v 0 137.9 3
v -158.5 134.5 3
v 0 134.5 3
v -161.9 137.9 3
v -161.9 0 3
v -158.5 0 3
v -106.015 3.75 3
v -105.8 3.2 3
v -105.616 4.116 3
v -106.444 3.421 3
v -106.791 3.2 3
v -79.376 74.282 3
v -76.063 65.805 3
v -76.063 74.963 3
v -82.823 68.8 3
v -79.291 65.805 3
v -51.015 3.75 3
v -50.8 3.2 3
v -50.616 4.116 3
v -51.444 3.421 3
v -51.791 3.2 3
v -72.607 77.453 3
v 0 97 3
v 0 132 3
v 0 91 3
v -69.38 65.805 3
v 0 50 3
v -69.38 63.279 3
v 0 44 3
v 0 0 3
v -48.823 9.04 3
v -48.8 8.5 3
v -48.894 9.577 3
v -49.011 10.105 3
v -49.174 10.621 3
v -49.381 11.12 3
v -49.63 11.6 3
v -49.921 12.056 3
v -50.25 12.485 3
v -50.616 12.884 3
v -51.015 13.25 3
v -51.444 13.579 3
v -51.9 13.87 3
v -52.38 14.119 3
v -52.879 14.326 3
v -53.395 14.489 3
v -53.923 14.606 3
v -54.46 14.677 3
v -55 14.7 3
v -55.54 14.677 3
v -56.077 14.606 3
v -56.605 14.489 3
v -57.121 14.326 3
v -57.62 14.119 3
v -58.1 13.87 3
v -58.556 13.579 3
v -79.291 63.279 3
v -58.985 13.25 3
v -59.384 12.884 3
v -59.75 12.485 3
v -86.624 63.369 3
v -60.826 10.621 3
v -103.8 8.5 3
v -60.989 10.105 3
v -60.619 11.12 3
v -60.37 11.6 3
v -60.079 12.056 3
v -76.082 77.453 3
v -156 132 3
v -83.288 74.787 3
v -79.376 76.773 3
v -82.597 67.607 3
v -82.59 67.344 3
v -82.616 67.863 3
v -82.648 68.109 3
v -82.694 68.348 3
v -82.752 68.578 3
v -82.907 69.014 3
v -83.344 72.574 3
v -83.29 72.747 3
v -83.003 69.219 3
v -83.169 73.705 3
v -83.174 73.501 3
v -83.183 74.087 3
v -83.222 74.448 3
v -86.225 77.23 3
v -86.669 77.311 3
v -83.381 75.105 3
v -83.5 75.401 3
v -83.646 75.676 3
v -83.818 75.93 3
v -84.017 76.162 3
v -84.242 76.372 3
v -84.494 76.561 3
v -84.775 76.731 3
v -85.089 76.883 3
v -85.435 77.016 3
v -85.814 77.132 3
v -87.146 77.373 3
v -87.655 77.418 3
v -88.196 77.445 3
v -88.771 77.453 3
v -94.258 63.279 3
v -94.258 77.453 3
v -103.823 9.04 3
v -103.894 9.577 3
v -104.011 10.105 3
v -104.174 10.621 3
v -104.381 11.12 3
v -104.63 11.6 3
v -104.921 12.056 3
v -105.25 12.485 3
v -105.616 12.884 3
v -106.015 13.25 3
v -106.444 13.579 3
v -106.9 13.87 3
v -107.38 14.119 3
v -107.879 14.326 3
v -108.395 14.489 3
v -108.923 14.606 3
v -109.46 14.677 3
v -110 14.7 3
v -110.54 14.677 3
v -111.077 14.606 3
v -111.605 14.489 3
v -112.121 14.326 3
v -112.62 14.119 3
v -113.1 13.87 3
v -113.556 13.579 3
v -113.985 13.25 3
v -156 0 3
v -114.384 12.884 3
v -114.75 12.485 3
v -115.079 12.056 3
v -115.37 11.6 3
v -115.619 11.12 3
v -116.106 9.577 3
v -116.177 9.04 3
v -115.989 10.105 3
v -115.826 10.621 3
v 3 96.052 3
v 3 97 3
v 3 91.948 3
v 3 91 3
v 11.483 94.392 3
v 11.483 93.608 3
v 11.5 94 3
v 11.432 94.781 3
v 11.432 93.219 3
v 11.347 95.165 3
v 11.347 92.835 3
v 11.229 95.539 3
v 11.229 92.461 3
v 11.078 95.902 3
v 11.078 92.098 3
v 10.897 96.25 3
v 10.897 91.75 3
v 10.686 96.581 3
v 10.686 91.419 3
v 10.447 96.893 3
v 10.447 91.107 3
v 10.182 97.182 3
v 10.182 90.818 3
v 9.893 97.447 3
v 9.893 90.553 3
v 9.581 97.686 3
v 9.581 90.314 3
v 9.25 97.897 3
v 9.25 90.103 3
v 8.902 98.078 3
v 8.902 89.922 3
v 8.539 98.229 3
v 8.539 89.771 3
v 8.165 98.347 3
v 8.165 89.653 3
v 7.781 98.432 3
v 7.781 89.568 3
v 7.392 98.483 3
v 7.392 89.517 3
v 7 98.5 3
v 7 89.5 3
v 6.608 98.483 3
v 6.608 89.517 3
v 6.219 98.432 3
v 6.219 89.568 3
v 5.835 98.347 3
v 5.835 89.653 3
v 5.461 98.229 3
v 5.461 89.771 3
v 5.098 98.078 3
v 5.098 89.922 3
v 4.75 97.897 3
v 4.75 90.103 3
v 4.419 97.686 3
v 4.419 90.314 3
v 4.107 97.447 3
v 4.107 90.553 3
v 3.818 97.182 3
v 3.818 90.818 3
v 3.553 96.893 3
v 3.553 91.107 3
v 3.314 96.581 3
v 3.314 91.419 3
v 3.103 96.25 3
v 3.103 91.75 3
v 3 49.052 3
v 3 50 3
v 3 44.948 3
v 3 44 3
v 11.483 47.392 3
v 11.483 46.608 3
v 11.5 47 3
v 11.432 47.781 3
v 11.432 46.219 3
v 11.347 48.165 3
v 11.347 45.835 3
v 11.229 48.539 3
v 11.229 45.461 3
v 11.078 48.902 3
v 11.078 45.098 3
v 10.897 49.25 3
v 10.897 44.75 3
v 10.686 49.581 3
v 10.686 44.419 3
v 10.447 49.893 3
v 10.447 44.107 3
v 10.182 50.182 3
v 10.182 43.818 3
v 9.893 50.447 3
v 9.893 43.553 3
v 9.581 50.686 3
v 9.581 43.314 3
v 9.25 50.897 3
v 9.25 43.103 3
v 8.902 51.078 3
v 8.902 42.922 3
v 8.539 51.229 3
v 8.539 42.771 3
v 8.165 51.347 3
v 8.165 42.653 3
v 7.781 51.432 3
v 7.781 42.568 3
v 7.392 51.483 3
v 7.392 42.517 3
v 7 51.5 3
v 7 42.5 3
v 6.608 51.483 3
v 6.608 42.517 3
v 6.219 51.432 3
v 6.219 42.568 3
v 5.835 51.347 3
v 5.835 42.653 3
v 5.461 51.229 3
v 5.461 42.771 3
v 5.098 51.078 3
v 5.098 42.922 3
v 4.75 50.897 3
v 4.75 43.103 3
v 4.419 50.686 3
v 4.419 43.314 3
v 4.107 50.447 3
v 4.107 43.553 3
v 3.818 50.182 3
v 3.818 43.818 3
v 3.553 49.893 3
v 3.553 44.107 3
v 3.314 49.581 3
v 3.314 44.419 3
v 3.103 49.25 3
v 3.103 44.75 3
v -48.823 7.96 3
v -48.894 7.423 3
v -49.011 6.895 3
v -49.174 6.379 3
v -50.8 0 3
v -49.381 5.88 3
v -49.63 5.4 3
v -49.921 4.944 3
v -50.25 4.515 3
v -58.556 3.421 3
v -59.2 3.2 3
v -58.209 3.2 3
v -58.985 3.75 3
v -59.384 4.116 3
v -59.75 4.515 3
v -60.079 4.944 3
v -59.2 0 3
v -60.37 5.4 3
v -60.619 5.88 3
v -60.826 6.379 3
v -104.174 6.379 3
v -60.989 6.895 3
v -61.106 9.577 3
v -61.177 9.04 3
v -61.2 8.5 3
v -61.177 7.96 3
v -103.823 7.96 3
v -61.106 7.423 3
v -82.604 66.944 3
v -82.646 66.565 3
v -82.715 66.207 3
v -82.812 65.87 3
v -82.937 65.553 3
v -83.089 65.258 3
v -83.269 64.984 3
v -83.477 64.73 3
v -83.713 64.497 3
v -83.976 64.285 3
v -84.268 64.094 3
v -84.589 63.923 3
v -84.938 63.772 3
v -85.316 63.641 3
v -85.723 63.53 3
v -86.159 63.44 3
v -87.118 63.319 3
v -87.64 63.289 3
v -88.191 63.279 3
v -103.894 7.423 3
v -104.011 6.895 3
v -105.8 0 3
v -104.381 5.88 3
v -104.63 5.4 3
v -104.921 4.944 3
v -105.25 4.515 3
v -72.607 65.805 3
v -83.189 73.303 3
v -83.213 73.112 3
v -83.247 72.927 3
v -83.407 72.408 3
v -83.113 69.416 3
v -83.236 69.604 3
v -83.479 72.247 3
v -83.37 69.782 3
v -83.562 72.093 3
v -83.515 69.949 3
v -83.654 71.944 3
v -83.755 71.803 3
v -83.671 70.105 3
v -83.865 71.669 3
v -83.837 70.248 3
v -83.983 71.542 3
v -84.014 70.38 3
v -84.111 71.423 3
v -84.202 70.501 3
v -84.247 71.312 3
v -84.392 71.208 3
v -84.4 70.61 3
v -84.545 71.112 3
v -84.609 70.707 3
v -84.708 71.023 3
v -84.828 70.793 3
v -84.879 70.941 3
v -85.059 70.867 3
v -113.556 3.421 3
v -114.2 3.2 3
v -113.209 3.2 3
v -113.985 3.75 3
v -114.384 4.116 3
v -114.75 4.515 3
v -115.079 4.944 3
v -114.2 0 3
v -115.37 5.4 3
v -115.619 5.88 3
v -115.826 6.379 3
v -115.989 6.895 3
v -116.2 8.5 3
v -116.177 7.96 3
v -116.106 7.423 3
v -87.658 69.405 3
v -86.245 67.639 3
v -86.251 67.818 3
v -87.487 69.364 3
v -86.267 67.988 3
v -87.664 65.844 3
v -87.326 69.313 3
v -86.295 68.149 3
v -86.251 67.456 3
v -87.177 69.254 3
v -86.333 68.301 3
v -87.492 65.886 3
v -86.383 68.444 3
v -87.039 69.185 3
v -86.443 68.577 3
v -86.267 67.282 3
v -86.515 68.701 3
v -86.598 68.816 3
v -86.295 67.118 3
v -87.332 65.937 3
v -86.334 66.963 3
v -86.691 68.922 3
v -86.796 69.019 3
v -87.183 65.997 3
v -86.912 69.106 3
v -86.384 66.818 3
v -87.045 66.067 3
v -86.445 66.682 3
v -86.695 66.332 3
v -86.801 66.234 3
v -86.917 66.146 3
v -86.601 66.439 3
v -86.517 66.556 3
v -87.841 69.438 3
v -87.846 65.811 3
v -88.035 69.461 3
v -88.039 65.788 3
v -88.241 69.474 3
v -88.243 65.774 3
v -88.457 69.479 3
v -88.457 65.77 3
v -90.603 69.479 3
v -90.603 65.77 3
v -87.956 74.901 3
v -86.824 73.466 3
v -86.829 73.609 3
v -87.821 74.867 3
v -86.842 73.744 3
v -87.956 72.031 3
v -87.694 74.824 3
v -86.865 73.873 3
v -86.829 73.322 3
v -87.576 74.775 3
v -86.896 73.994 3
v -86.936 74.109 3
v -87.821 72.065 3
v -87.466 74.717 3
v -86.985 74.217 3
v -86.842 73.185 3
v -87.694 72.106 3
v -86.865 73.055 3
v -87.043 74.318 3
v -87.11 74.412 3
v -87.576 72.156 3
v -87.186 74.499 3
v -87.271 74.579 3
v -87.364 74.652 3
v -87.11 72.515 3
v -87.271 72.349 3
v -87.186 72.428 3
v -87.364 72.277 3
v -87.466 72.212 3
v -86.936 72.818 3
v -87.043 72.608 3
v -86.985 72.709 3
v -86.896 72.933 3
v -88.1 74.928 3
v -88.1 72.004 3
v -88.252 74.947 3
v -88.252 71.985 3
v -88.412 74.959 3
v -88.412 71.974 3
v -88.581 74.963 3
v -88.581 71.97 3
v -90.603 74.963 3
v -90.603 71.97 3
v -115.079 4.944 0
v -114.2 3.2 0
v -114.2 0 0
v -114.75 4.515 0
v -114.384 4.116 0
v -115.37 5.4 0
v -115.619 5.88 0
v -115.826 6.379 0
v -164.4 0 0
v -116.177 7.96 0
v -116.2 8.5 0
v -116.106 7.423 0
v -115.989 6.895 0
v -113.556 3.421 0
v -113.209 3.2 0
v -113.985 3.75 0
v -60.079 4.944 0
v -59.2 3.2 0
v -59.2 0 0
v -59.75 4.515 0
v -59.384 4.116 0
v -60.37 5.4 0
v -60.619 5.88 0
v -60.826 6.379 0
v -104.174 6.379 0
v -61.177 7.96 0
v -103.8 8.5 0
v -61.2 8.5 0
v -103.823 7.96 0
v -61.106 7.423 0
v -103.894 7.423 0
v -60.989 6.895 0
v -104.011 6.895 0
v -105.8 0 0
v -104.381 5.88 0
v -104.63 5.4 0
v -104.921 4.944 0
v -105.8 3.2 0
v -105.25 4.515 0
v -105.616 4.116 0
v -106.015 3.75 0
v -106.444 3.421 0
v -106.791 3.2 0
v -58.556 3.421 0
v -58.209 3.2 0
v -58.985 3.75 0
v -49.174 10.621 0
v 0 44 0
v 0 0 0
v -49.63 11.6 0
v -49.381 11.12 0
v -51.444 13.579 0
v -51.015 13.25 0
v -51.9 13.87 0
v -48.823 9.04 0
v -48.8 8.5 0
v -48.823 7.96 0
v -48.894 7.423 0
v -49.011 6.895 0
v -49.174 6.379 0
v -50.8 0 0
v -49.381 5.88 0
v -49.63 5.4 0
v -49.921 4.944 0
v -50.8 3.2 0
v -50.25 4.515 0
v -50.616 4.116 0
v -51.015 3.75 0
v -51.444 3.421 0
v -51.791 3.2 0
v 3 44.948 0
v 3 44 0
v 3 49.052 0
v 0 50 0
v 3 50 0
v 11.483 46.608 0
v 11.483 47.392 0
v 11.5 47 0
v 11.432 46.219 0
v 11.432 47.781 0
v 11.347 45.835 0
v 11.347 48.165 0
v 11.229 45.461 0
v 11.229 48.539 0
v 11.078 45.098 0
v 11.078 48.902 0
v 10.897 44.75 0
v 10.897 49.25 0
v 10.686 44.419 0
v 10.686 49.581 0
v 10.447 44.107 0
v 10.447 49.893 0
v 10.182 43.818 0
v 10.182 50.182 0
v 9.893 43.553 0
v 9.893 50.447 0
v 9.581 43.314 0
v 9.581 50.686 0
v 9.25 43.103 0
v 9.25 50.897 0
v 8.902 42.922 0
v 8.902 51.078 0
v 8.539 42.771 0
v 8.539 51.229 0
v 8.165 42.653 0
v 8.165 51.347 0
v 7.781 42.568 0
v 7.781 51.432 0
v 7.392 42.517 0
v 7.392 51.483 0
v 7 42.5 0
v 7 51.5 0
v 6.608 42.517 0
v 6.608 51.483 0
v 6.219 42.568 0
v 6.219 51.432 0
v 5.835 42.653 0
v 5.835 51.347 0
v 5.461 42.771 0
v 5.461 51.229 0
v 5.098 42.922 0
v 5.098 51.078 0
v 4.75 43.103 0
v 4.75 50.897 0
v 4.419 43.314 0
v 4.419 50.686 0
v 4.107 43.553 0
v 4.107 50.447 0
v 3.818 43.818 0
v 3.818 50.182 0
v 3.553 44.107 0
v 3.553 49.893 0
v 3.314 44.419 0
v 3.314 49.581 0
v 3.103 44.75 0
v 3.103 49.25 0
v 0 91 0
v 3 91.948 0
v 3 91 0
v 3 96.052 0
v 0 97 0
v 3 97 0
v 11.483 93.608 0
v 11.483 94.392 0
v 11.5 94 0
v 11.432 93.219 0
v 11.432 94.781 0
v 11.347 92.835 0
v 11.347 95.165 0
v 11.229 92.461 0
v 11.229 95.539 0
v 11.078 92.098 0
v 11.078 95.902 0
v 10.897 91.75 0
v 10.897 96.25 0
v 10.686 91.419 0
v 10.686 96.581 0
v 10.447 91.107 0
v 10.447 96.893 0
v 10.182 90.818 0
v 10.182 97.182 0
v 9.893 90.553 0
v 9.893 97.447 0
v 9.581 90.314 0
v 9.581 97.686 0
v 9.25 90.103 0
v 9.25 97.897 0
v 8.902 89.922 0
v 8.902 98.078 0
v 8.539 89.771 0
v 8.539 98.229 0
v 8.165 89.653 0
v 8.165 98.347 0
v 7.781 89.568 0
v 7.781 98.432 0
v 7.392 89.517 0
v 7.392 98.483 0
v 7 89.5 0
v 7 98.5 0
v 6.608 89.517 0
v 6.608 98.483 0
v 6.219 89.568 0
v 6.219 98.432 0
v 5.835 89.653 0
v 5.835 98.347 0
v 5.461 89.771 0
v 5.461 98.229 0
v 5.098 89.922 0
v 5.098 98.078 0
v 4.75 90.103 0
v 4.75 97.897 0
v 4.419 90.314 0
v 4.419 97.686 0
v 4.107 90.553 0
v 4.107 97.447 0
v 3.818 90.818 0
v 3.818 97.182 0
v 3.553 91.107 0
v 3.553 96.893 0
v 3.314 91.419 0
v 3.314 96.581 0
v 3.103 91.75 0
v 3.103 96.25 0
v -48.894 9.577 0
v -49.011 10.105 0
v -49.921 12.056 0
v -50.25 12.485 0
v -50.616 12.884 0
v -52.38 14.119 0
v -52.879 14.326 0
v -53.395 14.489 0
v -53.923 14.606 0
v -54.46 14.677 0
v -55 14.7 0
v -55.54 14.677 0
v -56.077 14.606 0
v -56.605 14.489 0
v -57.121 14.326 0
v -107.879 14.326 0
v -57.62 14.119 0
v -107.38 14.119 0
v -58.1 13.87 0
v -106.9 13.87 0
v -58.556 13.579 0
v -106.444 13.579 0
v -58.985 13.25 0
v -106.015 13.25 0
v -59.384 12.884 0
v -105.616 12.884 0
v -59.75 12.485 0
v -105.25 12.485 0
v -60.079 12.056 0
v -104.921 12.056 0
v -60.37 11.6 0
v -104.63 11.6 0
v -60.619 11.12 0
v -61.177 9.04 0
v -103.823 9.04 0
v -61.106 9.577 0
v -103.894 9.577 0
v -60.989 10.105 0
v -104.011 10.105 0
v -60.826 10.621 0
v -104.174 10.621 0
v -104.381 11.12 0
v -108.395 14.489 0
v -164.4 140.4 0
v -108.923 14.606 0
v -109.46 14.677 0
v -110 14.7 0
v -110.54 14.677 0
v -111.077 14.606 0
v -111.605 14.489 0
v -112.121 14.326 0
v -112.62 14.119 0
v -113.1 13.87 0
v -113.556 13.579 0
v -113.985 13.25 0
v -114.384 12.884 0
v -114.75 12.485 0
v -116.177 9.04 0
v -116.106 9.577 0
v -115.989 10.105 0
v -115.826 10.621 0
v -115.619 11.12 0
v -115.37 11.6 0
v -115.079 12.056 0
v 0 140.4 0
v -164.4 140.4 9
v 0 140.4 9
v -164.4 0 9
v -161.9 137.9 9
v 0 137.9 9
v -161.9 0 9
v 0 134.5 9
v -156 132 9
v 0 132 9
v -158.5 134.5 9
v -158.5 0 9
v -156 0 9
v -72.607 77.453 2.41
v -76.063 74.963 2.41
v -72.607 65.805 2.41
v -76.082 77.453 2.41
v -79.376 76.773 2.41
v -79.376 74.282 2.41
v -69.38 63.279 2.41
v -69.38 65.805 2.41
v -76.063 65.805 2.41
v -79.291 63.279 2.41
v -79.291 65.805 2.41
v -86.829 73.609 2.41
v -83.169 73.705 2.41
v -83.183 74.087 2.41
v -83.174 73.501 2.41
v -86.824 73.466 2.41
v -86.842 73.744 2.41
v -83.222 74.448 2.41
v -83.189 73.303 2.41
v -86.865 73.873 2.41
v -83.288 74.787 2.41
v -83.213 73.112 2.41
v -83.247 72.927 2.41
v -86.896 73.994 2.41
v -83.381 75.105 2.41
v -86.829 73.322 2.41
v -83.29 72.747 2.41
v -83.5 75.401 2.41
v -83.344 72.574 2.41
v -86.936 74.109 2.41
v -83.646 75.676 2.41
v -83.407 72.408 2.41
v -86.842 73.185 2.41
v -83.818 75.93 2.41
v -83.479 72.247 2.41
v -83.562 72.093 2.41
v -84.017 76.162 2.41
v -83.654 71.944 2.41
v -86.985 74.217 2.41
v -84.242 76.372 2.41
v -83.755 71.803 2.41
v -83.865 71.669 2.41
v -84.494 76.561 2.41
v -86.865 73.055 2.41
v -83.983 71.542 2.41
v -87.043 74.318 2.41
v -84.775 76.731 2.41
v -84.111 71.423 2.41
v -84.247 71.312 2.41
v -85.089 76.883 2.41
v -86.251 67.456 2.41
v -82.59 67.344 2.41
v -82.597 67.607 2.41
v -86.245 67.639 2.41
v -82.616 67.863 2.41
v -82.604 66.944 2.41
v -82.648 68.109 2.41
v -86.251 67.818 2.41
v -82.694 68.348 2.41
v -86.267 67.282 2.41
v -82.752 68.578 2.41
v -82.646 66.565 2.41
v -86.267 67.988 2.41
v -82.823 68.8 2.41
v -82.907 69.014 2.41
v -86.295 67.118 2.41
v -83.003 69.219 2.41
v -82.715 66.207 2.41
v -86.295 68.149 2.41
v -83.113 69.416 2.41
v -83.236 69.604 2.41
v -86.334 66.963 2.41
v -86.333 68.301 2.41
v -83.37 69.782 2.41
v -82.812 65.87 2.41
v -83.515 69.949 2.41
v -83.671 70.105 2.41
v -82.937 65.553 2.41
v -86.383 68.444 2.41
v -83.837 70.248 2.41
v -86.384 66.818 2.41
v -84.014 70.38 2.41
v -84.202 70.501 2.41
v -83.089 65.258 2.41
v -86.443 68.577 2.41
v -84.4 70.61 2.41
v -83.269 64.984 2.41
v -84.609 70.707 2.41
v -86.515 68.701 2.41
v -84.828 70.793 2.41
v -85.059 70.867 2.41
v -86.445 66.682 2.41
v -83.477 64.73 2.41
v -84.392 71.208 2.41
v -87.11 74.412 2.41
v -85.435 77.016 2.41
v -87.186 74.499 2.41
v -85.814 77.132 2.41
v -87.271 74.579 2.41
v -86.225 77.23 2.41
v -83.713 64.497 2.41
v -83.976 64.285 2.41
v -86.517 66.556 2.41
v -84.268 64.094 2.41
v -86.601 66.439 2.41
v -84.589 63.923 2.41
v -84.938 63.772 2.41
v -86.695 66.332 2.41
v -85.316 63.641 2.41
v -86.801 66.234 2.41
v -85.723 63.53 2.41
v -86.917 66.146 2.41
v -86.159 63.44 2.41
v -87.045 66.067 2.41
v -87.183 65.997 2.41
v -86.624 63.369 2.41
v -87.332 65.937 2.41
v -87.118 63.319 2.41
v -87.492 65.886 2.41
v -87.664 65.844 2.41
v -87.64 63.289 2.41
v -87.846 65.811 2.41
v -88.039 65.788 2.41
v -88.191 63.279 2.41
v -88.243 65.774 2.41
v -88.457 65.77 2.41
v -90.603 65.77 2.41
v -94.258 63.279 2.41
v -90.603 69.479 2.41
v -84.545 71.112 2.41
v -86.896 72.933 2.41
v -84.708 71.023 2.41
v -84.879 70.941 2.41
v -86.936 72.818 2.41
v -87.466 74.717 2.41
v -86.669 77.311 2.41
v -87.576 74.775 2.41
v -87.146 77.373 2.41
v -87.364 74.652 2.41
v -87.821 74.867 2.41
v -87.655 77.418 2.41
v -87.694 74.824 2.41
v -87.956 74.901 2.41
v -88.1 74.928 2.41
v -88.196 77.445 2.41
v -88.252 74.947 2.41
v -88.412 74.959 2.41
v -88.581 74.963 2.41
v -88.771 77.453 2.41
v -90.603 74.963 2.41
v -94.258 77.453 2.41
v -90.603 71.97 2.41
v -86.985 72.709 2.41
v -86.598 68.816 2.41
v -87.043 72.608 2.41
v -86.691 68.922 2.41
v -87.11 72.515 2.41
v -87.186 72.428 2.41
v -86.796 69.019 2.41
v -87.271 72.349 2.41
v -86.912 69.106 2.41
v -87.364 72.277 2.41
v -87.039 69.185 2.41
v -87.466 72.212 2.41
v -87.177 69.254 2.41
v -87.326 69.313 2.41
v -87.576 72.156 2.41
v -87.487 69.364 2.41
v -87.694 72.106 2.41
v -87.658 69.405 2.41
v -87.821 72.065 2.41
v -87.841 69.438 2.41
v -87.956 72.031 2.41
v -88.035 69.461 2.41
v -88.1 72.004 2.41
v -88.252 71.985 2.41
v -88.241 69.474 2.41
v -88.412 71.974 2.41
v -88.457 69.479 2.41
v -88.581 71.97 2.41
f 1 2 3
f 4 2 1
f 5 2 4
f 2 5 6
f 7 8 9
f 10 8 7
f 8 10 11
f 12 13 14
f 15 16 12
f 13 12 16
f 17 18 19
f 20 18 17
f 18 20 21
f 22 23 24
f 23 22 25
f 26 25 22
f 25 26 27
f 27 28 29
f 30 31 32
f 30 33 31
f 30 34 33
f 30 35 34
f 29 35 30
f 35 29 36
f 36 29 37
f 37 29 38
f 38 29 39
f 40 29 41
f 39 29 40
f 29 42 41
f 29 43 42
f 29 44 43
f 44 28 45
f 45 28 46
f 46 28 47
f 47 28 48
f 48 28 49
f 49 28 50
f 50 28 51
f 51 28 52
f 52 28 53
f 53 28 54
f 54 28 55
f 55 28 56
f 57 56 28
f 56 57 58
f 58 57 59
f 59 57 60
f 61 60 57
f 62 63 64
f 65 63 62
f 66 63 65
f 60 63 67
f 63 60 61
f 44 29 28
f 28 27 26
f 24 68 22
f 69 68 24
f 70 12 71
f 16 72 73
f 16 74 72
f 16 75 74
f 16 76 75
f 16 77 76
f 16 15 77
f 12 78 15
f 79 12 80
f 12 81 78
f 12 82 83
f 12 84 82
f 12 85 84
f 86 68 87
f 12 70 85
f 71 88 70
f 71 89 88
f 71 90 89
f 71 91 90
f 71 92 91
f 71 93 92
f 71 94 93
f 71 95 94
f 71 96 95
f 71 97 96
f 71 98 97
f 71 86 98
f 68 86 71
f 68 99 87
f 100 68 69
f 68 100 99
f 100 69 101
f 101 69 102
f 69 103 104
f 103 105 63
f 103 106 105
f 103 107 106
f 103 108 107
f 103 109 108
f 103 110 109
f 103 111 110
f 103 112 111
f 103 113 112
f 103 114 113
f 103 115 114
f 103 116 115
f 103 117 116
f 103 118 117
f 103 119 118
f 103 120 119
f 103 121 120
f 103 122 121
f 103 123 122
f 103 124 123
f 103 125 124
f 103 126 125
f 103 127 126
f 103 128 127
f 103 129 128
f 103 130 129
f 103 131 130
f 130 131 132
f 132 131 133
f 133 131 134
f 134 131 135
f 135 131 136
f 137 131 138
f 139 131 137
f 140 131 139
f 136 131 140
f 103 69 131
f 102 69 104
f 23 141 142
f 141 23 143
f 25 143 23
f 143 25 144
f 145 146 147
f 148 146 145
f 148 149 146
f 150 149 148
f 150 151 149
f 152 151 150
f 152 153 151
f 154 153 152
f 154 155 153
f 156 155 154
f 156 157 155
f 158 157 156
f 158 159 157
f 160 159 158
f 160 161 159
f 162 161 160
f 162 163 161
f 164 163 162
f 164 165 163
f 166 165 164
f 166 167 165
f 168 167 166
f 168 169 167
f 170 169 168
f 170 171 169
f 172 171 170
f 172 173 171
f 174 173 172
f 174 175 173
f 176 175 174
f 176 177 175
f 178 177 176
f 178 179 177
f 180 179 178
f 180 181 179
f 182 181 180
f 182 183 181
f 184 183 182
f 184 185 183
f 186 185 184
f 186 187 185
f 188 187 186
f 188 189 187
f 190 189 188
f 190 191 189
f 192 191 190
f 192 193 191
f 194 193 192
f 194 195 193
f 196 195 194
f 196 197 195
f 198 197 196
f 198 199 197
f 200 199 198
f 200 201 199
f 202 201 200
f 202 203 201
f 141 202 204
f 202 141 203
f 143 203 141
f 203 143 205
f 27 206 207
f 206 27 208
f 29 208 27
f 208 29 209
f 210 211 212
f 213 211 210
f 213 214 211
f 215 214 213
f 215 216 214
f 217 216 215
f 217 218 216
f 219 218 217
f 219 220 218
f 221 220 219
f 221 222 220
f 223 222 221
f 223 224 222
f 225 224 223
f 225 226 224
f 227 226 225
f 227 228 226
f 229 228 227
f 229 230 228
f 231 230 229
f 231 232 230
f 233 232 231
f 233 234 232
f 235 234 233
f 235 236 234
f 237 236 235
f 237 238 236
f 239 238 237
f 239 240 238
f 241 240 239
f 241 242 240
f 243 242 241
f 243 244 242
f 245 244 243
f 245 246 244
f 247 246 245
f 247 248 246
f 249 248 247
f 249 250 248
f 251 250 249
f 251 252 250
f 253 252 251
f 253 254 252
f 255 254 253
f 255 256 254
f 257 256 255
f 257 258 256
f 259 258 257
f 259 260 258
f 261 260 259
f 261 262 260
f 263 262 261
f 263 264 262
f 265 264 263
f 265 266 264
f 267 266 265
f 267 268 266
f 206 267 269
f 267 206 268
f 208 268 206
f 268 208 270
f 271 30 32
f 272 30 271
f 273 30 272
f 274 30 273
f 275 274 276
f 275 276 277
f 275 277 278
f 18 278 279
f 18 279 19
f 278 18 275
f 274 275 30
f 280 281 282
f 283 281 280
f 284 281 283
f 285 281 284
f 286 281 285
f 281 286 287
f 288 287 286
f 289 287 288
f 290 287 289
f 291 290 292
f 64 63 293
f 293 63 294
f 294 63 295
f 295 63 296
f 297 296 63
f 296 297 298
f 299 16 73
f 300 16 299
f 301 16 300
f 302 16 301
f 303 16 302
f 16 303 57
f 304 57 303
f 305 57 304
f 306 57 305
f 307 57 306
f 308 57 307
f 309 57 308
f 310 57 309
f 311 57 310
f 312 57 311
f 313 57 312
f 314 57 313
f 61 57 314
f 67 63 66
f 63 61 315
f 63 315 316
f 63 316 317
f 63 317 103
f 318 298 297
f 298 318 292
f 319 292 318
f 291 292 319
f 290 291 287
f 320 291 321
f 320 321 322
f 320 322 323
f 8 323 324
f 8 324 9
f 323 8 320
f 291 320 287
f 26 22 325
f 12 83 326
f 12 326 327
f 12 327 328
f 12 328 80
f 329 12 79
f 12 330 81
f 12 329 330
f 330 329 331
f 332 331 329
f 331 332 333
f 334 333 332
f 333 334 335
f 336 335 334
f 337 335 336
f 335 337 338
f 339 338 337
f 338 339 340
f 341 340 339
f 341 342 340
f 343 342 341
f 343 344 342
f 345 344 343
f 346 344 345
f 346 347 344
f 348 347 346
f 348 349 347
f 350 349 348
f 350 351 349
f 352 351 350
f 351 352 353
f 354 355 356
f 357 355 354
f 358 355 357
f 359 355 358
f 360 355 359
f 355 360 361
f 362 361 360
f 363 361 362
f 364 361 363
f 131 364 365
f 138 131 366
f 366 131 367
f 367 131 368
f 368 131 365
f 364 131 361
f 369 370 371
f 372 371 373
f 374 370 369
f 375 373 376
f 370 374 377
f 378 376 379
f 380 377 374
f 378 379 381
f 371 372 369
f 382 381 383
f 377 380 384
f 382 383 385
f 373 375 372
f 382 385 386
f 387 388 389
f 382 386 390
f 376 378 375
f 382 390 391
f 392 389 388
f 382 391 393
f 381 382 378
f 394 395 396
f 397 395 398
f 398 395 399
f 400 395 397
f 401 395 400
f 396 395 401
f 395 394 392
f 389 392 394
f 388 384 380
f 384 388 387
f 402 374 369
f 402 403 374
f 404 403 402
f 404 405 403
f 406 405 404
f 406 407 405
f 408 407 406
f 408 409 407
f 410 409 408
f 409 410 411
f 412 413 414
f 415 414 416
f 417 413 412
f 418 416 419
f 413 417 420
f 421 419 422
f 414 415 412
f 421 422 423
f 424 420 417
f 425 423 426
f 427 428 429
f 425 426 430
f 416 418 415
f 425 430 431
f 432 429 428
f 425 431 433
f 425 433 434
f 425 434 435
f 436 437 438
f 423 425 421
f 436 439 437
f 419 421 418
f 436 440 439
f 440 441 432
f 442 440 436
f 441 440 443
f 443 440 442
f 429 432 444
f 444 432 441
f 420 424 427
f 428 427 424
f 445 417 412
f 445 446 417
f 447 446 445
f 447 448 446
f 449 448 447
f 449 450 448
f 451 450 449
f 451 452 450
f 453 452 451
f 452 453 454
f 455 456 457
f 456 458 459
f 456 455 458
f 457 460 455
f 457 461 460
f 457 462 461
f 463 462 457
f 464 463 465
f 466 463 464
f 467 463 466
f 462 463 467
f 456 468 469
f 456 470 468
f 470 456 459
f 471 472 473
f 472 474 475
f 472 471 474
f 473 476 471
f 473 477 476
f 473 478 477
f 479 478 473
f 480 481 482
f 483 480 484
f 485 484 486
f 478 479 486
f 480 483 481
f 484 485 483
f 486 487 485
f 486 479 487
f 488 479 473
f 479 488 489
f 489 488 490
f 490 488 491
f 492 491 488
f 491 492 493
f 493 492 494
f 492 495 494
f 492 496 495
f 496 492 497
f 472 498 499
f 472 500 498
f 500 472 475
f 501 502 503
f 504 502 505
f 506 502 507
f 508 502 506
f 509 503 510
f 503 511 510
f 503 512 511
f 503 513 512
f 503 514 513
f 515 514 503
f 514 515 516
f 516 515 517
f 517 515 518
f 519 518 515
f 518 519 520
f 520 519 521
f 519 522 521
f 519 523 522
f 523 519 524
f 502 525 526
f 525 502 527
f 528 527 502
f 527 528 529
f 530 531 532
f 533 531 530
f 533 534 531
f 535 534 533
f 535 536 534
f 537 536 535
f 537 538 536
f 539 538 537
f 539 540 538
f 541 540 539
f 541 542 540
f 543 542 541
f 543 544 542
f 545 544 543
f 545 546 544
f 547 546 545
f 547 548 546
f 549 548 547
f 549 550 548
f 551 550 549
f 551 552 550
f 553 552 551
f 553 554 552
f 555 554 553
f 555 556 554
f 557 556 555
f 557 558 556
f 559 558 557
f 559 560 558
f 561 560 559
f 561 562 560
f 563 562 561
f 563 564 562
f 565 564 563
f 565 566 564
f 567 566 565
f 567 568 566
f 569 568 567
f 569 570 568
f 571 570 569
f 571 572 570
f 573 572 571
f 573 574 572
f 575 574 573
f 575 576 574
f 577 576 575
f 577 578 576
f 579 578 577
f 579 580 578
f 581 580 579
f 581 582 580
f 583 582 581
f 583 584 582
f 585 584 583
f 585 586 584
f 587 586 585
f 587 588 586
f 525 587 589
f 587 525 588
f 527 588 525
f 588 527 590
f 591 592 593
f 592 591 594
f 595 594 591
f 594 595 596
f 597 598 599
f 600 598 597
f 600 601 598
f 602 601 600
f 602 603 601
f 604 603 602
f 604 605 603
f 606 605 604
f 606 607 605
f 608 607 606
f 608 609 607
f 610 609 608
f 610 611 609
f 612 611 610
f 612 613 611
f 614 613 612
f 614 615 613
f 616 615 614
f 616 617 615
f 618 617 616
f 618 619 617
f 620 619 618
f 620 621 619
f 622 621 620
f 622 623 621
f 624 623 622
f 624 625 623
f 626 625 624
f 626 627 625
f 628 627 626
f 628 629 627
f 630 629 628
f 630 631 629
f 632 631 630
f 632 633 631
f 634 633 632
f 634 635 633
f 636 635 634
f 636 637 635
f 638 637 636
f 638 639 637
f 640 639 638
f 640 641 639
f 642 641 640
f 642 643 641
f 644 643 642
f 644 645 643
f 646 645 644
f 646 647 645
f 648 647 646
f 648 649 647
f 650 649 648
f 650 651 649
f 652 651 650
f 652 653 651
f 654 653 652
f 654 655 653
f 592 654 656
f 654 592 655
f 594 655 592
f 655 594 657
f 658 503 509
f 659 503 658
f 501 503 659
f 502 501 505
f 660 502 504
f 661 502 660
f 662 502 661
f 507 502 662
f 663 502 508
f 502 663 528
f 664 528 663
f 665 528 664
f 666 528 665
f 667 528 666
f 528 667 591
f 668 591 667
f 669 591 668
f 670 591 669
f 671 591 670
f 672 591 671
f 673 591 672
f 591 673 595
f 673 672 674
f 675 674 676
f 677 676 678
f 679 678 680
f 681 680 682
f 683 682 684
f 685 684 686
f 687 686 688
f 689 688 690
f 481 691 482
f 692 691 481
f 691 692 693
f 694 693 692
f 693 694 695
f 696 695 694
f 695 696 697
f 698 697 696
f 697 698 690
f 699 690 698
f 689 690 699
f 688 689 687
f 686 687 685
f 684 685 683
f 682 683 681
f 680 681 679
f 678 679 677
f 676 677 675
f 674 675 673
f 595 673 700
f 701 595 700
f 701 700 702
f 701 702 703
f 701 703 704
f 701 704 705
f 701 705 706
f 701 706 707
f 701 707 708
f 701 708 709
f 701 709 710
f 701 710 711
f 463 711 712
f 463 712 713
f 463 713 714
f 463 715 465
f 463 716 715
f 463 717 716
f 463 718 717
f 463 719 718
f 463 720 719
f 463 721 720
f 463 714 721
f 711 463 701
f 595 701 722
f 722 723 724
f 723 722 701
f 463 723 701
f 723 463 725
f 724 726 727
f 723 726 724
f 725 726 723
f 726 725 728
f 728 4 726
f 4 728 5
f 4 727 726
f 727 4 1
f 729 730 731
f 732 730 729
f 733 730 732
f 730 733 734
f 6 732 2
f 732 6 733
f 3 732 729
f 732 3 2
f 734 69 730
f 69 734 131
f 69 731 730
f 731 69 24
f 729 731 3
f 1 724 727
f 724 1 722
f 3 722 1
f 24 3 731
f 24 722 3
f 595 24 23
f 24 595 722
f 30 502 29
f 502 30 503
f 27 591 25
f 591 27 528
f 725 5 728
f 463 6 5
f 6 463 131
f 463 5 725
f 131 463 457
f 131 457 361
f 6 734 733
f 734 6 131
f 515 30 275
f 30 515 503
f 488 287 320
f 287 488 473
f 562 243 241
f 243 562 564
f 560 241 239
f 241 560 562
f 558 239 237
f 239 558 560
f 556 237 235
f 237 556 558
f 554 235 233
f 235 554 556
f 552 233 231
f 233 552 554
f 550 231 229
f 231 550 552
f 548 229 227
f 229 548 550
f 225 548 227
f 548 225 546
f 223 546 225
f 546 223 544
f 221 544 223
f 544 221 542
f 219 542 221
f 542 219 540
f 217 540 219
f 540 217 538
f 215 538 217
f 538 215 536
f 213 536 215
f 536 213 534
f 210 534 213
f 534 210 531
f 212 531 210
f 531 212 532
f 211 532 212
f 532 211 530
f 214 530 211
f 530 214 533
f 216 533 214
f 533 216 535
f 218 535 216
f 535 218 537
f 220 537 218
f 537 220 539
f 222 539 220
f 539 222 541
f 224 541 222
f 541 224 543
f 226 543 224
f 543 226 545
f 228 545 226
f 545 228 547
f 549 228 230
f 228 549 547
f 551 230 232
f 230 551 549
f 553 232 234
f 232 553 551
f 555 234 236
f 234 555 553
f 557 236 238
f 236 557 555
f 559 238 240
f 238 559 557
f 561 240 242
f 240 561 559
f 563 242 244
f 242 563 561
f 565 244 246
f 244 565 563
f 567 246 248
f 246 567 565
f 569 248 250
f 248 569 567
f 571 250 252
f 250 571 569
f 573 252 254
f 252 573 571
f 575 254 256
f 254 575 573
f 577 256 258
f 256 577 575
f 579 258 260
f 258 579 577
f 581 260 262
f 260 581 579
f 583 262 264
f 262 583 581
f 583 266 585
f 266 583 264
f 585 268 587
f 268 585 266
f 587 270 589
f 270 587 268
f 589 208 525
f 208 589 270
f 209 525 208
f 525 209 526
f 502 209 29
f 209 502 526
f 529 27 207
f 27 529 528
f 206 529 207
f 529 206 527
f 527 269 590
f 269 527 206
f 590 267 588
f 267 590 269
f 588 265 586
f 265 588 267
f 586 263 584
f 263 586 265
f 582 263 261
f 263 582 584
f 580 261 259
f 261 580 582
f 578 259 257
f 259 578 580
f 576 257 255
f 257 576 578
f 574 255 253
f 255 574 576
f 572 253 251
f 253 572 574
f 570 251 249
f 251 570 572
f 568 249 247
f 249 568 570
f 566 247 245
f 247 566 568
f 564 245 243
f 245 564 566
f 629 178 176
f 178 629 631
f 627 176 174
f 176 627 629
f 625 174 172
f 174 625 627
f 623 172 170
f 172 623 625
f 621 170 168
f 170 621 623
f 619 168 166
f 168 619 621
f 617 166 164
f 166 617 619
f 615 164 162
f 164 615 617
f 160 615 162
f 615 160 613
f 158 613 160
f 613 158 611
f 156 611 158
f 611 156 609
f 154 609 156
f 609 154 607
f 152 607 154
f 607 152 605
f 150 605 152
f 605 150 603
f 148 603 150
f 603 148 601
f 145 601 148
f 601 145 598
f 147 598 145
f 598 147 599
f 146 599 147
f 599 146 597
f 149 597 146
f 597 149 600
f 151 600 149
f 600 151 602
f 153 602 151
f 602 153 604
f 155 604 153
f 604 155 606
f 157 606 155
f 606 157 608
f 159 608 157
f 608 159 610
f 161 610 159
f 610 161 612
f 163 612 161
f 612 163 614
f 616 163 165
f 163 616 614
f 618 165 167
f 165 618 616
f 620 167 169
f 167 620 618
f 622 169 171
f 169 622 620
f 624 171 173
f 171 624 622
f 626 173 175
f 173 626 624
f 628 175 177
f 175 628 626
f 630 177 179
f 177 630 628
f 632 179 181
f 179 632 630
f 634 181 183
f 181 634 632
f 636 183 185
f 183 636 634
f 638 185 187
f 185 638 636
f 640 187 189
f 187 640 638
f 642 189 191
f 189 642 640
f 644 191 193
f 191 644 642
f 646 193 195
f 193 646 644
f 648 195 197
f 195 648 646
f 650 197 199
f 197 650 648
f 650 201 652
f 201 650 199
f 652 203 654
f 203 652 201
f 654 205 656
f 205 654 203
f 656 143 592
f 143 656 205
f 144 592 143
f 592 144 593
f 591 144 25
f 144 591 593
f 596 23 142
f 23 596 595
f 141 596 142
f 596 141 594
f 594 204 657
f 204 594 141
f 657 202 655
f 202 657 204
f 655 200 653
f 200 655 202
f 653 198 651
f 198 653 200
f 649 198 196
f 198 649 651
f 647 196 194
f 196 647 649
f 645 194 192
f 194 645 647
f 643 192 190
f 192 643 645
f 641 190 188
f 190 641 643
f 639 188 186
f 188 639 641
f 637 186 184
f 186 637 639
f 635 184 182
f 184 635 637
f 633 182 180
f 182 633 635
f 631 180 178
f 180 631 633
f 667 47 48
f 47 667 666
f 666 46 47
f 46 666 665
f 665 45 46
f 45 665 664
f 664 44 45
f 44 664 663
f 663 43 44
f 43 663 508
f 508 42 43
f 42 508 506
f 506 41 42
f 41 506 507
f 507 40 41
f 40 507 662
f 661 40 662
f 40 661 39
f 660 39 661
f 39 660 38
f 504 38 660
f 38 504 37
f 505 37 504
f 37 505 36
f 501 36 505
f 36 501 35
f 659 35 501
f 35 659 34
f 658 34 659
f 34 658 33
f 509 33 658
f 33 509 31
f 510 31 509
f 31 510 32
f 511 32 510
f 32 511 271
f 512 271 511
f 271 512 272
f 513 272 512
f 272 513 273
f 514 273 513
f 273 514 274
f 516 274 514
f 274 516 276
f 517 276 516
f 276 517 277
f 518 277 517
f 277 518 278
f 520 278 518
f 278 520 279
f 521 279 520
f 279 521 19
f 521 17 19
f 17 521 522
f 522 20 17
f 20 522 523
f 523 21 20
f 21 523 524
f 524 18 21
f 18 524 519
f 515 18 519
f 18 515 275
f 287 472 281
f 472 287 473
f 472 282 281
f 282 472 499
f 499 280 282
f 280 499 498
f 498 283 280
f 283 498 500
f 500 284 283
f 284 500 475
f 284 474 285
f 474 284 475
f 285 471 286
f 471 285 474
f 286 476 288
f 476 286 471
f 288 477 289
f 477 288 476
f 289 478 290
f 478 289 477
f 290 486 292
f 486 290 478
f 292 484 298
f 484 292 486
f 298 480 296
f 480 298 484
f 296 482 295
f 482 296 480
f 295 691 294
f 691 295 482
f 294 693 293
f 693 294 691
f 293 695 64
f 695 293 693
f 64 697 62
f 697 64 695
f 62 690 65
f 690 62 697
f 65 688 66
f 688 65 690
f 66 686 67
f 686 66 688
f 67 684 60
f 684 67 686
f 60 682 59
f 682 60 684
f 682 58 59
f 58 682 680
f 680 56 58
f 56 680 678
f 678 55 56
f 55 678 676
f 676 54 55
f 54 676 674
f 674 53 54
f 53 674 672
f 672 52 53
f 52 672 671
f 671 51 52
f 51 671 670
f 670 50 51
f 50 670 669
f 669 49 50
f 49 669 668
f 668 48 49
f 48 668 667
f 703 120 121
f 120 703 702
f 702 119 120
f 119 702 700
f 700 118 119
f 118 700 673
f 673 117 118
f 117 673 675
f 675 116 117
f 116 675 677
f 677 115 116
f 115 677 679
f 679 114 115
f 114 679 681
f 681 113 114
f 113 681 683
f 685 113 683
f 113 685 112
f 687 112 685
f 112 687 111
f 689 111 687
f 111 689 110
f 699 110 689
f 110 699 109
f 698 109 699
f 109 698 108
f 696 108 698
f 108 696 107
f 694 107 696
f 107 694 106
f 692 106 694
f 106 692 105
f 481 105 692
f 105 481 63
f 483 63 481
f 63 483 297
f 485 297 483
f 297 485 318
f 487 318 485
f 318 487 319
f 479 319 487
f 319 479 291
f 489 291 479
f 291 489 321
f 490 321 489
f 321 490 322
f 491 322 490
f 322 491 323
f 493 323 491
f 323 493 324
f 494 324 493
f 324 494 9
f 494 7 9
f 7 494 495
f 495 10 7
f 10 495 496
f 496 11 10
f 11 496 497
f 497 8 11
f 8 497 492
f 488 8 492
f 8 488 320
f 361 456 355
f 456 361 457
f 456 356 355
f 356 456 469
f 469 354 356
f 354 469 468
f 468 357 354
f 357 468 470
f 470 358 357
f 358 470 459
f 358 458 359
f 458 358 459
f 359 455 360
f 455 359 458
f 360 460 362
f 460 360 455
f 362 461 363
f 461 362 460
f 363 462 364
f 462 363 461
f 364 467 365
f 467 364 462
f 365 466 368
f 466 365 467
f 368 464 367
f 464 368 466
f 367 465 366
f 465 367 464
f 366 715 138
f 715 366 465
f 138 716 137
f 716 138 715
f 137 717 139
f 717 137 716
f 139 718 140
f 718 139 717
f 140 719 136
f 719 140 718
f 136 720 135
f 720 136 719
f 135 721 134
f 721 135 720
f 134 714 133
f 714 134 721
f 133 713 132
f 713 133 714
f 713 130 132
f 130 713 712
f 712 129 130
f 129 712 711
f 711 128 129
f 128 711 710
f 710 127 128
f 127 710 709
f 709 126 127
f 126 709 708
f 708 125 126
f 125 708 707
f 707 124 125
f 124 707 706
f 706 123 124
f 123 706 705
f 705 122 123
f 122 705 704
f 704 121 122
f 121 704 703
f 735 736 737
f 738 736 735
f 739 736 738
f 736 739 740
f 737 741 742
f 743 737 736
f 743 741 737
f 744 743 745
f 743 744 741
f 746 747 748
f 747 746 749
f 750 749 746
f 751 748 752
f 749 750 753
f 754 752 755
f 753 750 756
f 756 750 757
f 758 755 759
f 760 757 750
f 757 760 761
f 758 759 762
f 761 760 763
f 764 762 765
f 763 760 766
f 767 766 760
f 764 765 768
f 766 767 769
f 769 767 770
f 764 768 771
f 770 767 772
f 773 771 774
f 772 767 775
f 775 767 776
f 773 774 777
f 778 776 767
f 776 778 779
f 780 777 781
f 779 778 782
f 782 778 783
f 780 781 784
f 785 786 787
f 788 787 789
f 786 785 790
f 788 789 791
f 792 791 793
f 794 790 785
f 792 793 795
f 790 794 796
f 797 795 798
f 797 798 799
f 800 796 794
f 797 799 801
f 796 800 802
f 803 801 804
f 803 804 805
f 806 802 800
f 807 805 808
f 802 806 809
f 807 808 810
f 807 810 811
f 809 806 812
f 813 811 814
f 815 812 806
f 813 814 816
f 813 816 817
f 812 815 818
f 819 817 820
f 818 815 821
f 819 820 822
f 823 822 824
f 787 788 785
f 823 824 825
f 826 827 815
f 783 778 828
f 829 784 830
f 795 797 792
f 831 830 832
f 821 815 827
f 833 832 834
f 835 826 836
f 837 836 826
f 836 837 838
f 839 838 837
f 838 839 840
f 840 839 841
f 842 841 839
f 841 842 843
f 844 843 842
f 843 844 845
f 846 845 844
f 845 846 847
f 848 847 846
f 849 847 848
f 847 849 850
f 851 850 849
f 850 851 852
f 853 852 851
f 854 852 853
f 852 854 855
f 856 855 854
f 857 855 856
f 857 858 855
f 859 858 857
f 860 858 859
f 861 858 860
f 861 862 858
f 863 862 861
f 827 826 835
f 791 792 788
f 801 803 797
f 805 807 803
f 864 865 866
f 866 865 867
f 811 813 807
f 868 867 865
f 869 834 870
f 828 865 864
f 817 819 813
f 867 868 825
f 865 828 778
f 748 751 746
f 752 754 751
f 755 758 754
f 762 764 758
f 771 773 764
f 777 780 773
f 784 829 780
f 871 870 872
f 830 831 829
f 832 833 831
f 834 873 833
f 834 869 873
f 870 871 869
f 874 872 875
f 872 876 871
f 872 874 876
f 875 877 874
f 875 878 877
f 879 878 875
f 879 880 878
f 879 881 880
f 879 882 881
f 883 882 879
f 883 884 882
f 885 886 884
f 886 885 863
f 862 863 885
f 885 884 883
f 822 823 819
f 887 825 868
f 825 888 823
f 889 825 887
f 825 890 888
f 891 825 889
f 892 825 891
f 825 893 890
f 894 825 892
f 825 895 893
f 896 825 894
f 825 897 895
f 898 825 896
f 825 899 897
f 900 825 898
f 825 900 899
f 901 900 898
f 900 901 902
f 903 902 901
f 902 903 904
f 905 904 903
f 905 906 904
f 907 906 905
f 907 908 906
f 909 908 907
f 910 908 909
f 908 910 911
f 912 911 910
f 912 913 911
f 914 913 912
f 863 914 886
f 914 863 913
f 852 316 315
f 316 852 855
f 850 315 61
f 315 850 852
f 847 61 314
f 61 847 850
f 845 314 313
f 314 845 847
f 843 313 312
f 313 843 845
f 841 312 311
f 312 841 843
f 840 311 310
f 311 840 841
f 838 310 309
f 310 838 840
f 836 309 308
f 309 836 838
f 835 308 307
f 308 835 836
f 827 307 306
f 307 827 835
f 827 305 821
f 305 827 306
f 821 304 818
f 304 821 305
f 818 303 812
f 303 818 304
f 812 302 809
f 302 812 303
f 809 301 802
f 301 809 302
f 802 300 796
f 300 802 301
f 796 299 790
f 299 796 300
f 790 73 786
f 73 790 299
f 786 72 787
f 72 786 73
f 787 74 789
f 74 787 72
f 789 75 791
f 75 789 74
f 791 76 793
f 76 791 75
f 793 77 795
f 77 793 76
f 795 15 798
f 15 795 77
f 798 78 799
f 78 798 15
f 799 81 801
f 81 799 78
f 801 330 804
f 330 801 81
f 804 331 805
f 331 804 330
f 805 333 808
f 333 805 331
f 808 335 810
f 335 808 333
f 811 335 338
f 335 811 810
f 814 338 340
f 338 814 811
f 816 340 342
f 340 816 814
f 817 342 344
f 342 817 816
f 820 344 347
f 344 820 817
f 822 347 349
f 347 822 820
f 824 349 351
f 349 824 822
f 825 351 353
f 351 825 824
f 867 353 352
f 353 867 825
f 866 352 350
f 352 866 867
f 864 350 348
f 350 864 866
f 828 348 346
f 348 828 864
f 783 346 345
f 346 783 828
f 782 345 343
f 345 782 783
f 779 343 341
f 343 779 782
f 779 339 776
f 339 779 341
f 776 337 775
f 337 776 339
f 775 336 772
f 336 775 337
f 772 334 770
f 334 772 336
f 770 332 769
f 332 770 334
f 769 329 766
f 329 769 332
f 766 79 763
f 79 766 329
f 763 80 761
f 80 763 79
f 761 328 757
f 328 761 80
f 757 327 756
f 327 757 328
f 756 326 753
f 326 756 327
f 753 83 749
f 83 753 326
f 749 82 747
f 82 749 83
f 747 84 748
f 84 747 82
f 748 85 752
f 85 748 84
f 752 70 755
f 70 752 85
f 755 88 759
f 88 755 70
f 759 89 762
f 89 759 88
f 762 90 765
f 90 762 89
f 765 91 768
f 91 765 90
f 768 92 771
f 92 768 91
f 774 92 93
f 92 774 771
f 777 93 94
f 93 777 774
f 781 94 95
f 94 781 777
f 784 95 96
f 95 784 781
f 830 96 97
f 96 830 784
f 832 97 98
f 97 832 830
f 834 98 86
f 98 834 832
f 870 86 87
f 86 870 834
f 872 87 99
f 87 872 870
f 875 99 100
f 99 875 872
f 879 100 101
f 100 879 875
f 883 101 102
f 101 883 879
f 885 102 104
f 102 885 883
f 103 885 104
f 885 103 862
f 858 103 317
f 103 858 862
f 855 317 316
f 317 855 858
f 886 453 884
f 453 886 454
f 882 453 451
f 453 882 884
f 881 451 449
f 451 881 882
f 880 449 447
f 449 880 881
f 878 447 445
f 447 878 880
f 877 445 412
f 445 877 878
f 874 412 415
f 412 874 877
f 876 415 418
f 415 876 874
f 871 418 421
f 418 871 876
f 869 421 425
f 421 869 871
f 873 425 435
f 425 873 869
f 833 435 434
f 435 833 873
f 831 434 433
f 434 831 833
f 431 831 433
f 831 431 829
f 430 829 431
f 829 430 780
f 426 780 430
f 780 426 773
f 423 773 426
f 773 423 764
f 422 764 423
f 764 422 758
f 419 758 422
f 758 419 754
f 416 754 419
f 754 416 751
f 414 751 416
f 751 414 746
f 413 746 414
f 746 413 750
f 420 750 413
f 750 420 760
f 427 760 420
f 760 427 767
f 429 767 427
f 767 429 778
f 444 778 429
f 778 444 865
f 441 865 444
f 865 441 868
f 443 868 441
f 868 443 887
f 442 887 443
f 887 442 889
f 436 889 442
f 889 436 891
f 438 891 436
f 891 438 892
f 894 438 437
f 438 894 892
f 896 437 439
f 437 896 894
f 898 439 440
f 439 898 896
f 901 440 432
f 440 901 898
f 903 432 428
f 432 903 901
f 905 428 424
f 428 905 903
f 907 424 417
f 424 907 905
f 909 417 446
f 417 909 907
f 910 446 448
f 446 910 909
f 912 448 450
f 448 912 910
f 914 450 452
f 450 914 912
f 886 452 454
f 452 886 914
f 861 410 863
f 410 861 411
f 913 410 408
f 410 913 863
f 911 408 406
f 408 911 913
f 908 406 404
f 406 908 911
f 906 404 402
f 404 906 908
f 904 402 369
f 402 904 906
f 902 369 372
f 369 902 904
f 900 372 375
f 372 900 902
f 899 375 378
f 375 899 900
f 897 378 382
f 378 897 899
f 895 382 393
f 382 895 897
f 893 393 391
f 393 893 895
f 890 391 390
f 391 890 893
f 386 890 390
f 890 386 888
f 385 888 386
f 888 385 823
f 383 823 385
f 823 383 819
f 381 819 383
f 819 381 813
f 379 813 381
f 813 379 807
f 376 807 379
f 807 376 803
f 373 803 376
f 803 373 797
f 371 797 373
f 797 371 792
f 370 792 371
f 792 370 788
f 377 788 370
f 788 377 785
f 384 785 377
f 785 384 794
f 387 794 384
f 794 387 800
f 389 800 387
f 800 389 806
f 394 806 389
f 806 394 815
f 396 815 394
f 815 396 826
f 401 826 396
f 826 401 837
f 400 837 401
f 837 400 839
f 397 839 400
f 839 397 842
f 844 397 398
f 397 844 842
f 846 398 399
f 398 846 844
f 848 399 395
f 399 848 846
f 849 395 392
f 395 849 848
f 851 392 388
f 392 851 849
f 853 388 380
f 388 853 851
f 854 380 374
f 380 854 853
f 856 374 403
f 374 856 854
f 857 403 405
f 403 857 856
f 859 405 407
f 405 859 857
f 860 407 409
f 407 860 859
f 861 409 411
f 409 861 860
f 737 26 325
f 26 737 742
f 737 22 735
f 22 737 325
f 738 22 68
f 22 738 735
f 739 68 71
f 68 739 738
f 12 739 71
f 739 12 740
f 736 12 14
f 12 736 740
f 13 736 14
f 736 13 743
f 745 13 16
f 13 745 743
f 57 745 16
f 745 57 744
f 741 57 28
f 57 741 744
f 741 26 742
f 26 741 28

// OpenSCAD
// P05 — Back quarter B1 (behind Q1). Outer face on the bed, ridges up. PLA, 3 walls.
// Needs lfh_v1_reference.scad in the same folder.
include <lfh_v1_reference.scad>
part = "B1";
pose = "print";
